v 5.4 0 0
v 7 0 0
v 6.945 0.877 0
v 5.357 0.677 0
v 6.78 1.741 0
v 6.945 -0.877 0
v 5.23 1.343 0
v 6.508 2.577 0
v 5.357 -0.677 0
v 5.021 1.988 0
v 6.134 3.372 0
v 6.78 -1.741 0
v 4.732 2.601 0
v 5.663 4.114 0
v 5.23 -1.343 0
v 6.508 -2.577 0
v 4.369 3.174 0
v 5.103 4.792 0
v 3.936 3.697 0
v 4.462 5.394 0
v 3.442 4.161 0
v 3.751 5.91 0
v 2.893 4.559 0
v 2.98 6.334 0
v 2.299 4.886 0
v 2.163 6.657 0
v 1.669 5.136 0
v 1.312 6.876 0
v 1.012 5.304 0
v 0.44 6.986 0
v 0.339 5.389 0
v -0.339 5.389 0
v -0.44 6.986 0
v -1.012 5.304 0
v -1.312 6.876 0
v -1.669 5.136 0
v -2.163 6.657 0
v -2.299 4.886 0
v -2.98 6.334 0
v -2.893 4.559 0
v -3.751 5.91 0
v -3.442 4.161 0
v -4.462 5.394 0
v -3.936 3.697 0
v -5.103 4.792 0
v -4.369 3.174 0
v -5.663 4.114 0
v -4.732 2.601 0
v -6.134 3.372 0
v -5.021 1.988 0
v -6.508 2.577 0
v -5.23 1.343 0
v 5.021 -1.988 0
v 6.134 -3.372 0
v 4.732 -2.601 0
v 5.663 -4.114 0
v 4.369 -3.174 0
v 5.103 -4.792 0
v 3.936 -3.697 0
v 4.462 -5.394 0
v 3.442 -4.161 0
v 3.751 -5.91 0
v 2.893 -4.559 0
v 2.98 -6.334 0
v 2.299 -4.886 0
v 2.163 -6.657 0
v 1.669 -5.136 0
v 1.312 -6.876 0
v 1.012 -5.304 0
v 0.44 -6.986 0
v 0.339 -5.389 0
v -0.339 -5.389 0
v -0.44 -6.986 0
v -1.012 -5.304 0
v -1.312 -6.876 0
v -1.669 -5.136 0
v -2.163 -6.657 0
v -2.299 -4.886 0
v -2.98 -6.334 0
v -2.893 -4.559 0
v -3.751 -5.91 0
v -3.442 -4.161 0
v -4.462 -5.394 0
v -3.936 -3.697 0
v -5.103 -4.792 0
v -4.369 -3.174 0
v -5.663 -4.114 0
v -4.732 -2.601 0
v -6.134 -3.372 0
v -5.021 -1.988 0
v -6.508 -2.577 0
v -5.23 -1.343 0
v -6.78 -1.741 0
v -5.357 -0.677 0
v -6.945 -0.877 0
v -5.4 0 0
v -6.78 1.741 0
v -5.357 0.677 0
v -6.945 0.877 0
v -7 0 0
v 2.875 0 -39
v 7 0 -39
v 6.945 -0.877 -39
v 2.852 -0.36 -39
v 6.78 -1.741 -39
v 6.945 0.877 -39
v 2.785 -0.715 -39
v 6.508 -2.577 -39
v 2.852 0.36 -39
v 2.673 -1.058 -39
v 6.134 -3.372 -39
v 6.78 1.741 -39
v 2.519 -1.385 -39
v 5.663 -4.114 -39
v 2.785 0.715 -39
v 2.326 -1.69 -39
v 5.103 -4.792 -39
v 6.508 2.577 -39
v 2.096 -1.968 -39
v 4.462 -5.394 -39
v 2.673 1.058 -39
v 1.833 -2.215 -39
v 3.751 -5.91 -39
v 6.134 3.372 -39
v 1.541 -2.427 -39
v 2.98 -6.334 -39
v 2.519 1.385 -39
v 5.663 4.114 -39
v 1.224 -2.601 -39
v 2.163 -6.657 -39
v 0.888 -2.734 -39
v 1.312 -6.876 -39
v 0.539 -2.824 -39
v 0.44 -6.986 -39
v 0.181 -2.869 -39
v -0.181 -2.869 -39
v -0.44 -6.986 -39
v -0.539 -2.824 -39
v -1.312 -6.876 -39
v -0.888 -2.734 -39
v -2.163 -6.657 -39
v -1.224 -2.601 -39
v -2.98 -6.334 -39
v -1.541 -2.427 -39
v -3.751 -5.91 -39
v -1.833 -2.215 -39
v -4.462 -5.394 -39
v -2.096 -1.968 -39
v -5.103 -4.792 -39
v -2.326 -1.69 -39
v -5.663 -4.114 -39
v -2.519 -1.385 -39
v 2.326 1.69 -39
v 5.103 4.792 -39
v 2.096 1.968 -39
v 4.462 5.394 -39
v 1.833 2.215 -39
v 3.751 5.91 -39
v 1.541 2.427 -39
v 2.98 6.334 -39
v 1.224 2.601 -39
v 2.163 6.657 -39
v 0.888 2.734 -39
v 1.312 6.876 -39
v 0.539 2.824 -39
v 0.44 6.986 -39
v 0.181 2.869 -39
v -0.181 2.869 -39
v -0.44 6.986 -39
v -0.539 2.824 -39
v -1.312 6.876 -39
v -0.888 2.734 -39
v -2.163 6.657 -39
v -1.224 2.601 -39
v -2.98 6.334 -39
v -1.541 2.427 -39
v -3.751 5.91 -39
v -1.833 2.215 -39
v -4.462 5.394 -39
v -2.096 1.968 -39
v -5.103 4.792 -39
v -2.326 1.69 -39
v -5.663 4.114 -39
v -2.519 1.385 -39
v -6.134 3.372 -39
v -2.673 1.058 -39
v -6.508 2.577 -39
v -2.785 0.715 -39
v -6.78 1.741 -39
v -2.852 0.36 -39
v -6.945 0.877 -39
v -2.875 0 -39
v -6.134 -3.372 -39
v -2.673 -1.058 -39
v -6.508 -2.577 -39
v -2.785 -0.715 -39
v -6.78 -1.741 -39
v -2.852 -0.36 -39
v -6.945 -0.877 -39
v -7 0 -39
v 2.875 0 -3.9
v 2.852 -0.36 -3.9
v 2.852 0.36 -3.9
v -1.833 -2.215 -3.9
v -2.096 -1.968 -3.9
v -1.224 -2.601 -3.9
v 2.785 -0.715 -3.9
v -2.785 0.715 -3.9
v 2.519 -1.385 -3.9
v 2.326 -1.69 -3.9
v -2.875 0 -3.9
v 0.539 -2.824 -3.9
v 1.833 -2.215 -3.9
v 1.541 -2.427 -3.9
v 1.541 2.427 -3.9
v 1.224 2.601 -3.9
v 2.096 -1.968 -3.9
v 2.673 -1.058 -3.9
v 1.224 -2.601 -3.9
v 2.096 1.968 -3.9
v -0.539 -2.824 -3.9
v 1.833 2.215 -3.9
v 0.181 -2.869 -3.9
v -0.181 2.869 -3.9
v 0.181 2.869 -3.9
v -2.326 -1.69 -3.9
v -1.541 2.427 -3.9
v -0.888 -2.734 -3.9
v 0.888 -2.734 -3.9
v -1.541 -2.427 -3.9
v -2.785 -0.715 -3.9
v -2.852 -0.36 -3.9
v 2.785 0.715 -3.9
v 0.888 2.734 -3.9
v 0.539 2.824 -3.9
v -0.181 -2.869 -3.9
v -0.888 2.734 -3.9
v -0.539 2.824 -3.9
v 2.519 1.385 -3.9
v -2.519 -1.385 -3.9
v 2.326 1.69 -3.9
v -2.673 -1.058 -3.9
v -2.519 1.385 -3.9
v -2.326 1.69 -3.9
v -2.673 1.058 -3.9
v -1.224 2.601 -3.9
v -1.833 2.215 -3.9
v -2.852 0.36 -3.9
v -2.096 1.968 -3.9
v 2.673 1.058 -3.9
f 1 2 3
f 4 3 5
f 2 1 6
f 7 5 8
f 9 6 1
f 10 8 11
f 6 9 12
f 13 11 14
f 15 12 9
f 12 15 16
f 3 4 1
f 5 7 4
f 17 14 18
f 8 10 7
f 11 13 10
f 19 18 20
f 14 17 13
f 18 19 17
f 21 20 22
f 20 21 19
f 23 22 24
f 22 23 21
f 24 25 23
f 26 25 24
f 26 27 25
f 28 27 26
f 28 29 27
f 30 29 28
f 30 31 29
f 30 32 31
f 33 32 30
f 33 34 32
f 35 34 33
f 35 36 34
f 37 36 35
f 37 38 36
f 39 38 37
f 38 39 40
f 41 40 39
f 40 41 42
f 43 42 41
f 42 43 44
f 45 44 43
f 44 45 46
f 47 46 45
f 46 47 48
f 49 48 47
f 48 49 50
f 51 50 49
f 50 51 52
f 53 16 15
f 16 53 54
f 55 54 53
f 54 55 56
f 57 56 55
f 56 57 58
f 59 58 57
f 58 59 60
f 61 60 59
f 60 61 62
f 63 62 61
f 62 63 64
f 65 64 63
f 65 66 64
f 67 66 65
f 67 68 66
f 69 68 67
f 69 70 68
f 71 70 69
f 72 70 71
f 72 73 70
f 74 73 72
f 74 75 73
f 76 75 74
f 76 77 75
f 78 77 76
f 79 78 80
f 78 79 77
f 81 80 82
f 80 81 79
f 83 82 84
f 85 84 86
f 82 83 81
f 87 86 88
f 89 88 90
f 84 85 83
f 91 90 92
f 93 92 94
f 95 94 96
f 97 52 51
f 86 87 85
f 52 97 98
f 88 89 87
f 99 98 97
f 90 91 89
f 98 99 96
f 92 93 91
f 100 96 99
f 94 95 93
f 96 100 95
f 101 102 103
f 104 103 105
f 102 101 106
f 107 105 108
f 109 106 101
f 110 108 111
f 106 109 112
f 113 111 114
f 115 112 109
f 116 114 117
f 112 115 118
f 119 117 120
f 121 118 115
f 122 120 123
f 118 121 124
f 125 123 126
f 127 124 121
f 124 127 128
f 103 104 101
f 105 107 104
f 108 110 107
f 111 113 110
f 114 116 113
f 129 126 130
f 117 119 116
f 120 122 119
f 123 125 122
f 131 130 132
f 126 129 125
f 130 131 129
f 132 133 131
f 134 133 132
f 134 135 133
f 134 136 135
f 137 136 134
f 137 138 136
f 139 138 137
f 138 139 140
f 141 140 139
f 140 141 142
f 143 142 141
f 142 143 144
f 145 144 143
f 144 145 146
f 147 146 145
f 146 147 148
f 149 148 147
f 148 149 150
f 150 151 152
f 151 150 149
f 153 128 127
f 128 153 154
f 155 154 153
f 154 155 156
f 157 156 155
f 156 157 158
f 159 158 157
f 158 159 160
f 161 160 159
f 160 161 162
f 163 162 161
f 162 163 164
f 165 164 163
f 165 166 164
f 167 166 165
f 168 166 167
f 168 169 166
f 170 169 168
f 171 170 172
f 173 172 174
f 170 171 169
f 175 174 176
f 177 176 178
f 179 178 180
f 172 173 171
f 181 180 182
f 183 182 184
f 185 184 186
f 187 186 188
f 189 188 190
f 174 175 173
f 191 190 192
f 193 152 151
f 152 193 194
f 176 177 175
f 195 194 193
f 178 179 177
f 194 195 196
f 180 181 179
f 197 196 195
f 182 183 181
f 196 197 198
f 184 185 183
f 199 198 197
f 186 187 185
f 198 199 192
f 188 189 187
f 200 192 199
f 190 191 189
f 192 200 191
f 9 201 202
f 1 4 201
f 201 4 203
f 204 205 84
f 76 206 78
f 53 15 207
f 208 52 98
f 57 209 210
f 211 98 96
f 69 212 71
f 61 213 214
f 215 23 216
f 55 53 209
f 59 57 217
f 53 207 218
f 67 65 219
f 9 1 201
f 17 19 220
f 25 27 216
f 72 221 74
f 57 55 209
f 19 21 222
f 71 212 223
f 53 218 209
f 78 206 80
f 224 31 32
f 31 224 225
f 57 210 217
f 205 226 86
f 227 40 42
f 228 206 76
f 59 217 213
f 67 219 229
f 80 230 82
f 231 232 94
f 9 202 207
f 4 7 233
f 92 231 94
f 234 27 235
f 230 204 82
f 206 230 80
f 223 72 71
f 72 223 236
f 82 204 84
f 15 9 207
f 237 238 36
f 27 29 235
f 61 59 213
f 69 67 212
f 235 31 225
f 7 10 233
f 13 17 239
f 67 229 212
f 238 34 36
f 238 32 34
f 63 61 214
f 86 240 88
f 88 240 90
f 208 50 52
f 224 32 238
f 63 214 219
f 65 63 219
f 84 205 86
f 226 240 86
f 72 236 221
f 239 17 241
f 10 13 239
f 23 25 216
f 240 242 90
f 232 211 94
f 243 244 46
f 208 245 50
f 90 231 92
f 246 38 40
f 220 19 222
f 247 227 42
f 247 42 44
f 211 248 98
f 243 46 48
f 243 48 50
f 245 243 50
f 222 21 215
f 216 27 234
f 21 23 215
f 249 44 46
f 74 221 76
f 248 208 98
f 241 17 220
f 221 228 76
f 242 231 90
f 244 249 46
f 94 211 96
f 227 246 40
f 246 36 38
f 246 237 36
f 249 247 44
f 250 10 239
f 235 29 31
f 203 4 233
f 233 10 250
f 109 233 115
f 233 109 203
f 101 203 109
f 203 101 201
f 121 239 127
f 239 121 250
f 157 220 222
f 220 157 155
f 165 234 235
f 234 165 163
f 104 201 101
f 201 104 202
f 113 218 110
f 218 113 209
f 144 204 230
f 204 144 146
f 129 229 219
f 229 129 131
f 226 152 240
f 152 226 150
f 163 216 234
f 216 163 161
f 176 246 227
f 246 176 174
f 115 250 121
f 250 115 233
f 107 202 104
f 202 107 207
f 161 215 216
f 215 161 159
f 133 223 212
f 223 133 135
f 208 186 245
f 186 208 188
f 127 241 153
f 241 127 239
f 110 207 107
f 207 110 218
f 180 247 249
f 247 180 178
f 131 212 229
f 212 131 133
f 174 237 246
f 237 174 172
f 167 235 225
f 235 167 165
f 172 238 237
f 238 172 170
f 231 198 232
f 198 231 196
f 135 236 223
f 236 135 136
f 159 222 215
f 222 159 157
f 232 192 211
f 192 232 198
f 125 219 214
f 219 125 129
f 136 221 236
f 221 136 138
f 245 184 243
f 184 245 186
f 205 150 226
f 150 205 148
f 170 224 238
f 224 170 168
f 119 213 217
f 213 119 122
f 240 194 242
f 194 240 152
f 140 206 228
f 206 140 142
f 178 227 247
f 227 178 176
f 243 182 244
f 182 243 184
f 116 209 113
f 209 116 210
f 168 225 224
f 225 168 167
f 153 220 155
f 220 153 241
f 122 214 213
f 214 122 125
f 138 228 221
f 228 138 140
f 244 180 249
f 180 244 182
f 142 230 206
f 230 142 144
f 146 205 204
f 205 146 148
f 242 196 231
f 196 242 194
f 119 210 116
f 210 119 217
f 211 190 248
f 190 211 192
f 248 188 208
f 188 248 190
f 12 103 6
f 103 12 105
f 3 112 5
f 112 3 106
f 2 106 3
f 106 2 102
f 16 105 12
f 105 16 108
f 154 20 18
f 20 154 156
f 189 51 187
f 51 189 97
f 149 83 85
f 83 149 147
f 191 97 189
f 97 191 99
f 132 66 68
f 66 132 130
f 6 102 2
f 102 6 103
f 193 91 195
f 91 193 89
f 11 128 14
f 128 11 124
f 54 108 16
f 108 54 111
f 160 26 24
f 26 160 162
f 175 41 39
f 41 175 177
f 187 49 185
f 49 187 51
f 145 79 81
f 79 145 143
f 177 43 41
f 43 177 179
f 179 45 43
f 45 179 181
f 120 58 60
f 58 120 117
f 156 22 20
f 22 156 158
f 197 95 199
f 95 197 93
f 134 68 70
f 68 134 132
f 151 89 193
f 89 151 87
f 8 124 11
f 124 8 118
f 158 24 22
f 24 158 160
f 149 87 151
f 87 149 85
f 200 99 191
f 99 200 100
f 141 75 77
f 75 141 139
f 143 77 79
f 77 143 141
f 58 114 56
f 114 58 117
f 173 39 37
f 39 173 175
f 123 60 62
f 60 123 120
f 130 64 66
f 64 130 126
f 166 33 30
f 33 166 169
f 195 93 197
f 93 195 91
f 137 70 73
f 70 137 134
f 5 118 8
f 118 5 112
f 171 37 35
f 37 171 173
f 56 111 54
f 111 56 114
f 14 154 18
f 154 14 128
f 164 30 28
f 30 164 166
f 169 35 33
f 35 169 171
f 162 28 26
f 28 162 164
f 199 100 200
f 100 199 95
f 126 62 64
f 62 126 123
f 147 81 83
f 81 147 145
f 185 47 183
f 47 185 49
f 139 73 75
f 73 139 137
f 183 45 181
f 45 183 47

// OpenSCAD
$fn = 50;


difference() {
	union() {
		translate(v = [0, 0, -39.0000000000]) {
			cylinder(h = 39, r = 7.0000000000);
		}
	}
	union() {
		translate(v = [0, 0, 0]) {
			rotate(a = [0, 0, 0]) {
				difference() {
					union() {
						#translate(v = [0, 0, -39.0000000000]) {
							cylinder(h = 39, r = 2.6000000000);
						}
						#translate(v = [0, 0, -3.9000000000]) {
							cylinder(h = 3.9000000000, r1 = 2.8750000000, r2 = 5.4000000000);
						}
						#translate(v = [0, 0, -39.0000000000]) {
							cylinder(h = 39, r = 2.8750000000);
						}
						#translate(v = [0, 0, -39.0000000000]) {
							cylinder(h = 39, r = 2.6000000000);
						}
					}
					union();
				}
			}
		}
	}
}
